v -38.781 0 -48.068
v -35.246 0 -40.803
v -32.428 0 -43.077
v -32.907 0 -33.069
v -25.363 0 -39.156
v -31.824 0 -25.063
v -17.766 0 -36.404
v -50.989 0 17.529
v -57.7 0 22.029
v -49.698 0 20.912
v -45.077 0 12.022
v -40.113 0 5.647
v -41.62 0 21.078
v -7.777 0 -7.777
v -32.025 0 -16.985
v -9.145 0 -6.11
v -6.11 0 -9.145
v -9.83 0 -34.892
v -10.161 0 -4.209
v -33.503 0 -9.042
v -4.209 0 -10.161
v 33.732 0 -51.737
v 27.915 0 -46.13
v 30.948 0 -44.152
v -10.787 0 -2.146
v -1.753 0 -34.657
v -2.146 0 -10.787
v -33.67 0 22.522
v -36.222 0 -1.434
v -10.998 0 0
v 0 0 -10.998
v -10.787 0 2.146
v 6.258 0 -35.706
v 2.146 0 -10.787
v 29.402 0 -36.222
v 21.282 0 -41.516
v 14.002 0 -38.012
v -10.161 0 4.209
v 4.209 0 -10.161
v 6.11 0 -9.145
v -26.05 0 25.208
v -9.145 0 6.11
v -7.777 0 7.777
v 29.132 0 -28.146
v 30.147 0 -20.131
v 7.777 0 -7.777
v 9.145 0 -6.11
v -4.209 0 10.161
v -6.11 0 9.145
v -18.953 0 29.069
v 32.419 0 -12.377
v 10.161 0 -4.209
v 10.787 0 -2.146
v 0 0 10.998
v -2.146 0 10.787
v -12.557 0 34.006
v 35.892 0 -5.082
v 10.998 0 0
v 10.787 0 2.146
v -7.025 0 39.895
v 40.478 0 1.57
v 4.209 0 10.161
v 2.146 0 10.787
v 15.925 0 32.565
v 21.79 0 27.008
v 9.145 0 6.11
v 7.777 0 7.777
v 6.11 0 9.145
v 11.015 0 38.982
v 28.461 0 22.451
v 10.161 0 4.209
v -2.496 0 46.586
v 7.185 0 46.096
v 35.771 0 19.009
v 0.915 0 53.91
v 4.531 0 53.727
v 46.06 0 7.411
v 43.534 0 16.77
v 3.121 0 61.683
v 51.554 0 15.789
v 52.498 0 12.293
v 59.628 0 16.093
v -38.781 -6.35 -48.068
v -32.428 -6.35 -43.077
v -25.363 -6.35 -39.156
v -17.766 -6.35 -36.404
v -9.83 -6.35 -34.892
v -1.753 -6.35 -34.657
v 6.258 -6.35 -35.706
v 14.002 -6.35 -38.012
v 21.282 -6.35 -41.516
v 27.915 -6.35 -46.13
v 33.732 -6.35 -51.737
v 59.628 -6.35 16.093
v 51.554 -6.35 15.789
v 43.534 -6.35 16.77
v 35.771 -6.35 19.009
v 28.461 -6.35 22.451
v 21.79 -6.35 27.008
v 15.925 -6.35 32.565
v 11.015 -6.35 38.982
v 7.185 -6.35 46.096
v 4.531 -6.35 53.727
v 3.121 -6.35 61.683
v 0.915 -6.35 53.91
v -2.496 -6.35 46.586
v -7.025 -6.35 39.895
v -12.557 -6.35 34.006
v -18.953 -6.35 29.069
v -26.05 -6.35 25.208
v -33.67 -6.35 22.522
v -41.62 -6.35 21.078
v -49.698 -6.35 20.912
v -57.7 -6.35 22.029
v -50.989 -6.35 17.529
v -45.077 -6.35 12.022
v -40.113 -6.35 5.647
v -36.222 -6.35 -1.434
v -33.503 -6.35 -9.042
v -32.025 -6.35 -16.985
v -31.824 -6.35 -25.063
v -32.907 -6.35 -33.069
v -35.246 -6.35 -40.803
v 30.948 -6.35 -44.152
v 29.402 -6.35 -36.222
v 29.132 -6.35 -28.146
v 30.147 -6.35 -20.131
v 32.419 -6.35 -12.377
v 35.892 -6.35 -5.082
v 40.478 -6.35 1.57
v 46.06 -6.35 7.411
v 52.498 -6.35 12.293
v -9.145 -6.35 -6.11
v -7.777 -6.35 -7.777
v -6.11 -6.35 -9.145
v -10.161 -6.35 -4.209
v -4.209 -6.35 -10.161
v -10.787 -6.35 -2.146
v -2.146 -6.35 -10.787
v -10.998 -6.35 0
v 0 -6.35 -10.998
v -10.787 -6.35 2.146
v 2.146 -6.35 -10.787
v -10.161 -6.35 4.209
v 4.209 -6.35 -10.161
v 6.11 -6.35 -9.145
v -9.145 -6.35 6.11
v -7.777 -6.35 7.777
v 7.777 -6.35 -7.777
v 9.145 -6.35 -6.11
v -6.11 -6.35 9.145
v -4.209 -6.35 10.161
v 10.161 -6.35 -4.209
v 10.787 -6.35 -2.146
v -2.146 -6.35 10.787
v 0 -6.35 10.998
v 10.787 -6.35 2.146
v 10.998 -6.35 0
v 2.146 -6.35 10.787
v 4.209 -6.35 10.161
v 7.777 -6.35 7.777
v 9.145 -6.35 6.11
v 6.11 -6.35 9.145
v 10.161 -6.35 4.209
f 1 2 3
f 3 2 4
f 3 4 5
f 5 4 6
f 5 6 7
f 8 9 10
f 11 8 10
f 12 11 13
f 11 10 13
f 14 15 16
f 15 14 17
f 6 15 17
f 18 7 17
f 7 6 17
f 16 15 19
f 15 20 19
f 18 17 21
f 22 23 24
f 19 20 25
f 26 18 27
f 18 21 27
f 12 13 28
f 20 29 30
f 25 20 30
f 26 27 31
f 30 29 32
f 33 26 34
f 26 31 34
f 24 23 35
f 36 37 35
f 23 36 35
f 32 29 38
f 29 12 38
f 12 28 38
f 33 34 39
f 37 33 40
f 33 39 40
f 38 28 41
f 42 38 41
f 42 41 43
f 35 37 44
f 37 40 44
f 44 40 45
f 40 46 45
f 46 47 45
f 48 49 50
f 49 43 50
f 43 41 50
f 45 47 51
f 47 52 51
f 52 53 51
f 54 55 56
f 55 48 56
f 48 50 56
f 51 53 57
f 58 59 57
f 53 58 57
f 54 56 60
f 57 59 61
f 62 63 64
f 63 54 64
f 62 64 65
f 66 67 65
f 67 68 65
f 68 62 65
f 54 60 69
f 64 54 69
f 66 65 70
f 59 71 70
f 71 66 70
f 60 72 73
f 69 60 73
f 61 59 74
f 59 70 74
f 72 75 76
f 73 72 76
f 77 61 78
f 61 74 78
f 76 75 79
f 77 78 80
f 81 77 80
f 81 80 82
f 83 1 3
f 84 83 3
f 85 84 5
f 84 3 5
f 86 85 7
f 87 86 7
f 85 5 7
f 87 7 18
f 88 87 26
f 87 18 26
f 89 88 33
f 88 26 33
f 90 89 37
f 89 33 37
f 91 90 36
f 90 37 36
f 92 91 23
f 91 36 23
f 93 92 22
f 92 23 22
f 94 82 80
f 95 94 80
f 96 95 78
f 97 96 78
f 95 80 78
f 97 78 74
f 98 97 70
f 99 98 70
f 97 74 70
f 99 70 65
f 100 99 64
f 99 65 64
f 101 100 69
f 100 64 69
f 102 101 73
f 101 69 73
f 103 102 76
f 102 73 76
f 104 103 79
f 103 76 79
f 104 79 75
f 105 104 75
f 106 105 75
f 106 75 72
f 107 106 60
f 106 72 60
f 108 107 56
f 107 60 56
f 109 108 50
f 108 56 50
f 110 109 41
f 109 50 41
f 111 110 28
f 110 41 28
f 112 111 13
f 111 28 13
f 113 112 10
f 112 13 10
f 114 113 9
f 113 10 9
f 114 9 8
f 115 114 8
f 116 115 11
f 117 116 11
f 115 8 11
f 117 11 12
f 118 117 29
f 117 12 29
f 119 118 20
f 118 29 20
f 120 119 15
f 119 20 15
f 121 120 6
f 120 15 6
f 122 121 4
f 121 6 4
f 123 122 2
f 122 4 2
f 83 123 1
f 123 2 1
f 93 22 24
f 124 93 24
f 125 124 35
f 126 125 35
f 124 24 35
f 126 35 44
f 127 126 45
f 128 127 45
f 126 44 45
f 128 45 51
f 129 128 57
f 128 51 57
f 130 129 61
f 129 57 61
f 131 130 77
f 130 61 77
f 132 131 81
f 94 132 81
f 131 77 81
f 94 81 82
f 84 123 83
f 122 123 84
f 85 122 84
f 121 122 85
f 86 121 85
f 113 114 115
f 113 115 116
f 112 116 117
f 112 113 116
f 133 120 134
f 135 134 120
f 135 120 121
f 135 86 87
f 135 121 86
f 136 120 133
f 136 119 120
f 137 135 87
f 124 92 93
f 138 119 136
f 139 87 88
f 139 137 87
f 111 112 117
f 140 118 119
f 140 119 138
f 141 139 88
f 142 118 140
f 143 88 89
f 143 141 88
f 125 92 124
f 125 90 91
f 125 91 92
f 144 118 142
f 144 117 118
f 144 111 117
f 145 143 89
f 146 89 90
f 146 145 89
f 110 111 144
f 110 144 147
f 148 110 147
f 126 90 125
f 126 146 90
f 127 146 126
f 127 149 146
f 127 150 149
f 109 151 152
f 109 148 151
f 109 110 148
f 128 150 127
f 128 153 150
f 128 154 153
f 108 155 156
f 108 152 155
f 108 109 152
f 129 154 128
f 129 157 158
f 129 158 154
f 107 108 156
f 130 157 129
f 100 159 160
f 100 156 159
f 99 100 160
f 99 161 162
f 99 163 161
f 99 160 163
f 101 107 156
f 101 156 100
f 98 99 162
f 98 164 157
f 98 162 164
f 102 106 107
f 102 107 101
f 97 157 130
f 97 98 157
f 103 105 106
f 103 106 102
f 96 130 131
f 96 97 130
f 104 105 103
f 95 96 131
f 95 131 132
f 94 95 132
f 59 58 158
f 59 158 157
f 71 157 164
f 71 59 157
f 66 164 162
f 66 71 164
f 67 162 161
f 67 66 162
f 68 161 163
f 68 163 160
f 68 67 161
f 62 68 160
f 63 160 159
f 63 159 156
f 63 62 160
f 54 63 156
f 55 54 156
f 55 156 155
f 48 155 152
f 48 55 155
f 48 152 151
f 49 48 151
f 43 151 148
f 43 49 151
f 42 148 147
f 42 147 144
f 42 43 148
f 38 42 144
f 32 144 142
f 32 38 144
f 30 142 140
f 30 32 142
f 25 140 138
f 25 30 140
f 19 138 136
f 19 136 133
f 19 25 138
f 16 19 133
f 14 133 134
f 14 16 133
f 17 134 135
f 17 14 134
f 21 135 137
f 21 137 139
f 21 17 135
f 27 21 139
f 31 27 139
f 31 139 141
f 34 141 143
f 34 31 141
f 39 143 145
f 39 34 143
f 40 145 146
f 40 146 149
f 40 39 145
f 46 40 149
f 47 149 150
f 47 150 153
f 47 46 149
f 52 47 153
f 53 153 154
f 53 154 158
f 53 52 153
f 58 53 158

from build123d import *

# Parameters (mm, degrees)
F0_R     = 10.9982
F1_DEPTH = 6.35


with BuildPart() as f1:
    # F0 (on Front) → F1 (new body)
    with BuildSketch(Plane.XZ):
        with BuildLine():
            ThreePointArc((3.120614, 61.683006), (-18.952567, 29.068953), (-57.699702, 22.028977))
            ThreePointArc((-57.699702, 22.028977), (-33.502883, -9.042162), (-38.780991, -48.06835))
            ThreePointArc((-38.780991, -48.06835), (-1.753353, -34.657317), (33.731732, -51.736851))
            ThreePointArc((33.731732, -51.736851), (32.419251, -12.377238), (59.628348, 16.093217))
            ThreePointArc((59.628348, 16.093217), (21.789552, 27.007763), (3.120614, 61.683006))
        make_face()
        Circle(F0_R, mode=Mode.SUBTRACT)
    extrude(amount=F1_DEPTH)


solid = f1.part
